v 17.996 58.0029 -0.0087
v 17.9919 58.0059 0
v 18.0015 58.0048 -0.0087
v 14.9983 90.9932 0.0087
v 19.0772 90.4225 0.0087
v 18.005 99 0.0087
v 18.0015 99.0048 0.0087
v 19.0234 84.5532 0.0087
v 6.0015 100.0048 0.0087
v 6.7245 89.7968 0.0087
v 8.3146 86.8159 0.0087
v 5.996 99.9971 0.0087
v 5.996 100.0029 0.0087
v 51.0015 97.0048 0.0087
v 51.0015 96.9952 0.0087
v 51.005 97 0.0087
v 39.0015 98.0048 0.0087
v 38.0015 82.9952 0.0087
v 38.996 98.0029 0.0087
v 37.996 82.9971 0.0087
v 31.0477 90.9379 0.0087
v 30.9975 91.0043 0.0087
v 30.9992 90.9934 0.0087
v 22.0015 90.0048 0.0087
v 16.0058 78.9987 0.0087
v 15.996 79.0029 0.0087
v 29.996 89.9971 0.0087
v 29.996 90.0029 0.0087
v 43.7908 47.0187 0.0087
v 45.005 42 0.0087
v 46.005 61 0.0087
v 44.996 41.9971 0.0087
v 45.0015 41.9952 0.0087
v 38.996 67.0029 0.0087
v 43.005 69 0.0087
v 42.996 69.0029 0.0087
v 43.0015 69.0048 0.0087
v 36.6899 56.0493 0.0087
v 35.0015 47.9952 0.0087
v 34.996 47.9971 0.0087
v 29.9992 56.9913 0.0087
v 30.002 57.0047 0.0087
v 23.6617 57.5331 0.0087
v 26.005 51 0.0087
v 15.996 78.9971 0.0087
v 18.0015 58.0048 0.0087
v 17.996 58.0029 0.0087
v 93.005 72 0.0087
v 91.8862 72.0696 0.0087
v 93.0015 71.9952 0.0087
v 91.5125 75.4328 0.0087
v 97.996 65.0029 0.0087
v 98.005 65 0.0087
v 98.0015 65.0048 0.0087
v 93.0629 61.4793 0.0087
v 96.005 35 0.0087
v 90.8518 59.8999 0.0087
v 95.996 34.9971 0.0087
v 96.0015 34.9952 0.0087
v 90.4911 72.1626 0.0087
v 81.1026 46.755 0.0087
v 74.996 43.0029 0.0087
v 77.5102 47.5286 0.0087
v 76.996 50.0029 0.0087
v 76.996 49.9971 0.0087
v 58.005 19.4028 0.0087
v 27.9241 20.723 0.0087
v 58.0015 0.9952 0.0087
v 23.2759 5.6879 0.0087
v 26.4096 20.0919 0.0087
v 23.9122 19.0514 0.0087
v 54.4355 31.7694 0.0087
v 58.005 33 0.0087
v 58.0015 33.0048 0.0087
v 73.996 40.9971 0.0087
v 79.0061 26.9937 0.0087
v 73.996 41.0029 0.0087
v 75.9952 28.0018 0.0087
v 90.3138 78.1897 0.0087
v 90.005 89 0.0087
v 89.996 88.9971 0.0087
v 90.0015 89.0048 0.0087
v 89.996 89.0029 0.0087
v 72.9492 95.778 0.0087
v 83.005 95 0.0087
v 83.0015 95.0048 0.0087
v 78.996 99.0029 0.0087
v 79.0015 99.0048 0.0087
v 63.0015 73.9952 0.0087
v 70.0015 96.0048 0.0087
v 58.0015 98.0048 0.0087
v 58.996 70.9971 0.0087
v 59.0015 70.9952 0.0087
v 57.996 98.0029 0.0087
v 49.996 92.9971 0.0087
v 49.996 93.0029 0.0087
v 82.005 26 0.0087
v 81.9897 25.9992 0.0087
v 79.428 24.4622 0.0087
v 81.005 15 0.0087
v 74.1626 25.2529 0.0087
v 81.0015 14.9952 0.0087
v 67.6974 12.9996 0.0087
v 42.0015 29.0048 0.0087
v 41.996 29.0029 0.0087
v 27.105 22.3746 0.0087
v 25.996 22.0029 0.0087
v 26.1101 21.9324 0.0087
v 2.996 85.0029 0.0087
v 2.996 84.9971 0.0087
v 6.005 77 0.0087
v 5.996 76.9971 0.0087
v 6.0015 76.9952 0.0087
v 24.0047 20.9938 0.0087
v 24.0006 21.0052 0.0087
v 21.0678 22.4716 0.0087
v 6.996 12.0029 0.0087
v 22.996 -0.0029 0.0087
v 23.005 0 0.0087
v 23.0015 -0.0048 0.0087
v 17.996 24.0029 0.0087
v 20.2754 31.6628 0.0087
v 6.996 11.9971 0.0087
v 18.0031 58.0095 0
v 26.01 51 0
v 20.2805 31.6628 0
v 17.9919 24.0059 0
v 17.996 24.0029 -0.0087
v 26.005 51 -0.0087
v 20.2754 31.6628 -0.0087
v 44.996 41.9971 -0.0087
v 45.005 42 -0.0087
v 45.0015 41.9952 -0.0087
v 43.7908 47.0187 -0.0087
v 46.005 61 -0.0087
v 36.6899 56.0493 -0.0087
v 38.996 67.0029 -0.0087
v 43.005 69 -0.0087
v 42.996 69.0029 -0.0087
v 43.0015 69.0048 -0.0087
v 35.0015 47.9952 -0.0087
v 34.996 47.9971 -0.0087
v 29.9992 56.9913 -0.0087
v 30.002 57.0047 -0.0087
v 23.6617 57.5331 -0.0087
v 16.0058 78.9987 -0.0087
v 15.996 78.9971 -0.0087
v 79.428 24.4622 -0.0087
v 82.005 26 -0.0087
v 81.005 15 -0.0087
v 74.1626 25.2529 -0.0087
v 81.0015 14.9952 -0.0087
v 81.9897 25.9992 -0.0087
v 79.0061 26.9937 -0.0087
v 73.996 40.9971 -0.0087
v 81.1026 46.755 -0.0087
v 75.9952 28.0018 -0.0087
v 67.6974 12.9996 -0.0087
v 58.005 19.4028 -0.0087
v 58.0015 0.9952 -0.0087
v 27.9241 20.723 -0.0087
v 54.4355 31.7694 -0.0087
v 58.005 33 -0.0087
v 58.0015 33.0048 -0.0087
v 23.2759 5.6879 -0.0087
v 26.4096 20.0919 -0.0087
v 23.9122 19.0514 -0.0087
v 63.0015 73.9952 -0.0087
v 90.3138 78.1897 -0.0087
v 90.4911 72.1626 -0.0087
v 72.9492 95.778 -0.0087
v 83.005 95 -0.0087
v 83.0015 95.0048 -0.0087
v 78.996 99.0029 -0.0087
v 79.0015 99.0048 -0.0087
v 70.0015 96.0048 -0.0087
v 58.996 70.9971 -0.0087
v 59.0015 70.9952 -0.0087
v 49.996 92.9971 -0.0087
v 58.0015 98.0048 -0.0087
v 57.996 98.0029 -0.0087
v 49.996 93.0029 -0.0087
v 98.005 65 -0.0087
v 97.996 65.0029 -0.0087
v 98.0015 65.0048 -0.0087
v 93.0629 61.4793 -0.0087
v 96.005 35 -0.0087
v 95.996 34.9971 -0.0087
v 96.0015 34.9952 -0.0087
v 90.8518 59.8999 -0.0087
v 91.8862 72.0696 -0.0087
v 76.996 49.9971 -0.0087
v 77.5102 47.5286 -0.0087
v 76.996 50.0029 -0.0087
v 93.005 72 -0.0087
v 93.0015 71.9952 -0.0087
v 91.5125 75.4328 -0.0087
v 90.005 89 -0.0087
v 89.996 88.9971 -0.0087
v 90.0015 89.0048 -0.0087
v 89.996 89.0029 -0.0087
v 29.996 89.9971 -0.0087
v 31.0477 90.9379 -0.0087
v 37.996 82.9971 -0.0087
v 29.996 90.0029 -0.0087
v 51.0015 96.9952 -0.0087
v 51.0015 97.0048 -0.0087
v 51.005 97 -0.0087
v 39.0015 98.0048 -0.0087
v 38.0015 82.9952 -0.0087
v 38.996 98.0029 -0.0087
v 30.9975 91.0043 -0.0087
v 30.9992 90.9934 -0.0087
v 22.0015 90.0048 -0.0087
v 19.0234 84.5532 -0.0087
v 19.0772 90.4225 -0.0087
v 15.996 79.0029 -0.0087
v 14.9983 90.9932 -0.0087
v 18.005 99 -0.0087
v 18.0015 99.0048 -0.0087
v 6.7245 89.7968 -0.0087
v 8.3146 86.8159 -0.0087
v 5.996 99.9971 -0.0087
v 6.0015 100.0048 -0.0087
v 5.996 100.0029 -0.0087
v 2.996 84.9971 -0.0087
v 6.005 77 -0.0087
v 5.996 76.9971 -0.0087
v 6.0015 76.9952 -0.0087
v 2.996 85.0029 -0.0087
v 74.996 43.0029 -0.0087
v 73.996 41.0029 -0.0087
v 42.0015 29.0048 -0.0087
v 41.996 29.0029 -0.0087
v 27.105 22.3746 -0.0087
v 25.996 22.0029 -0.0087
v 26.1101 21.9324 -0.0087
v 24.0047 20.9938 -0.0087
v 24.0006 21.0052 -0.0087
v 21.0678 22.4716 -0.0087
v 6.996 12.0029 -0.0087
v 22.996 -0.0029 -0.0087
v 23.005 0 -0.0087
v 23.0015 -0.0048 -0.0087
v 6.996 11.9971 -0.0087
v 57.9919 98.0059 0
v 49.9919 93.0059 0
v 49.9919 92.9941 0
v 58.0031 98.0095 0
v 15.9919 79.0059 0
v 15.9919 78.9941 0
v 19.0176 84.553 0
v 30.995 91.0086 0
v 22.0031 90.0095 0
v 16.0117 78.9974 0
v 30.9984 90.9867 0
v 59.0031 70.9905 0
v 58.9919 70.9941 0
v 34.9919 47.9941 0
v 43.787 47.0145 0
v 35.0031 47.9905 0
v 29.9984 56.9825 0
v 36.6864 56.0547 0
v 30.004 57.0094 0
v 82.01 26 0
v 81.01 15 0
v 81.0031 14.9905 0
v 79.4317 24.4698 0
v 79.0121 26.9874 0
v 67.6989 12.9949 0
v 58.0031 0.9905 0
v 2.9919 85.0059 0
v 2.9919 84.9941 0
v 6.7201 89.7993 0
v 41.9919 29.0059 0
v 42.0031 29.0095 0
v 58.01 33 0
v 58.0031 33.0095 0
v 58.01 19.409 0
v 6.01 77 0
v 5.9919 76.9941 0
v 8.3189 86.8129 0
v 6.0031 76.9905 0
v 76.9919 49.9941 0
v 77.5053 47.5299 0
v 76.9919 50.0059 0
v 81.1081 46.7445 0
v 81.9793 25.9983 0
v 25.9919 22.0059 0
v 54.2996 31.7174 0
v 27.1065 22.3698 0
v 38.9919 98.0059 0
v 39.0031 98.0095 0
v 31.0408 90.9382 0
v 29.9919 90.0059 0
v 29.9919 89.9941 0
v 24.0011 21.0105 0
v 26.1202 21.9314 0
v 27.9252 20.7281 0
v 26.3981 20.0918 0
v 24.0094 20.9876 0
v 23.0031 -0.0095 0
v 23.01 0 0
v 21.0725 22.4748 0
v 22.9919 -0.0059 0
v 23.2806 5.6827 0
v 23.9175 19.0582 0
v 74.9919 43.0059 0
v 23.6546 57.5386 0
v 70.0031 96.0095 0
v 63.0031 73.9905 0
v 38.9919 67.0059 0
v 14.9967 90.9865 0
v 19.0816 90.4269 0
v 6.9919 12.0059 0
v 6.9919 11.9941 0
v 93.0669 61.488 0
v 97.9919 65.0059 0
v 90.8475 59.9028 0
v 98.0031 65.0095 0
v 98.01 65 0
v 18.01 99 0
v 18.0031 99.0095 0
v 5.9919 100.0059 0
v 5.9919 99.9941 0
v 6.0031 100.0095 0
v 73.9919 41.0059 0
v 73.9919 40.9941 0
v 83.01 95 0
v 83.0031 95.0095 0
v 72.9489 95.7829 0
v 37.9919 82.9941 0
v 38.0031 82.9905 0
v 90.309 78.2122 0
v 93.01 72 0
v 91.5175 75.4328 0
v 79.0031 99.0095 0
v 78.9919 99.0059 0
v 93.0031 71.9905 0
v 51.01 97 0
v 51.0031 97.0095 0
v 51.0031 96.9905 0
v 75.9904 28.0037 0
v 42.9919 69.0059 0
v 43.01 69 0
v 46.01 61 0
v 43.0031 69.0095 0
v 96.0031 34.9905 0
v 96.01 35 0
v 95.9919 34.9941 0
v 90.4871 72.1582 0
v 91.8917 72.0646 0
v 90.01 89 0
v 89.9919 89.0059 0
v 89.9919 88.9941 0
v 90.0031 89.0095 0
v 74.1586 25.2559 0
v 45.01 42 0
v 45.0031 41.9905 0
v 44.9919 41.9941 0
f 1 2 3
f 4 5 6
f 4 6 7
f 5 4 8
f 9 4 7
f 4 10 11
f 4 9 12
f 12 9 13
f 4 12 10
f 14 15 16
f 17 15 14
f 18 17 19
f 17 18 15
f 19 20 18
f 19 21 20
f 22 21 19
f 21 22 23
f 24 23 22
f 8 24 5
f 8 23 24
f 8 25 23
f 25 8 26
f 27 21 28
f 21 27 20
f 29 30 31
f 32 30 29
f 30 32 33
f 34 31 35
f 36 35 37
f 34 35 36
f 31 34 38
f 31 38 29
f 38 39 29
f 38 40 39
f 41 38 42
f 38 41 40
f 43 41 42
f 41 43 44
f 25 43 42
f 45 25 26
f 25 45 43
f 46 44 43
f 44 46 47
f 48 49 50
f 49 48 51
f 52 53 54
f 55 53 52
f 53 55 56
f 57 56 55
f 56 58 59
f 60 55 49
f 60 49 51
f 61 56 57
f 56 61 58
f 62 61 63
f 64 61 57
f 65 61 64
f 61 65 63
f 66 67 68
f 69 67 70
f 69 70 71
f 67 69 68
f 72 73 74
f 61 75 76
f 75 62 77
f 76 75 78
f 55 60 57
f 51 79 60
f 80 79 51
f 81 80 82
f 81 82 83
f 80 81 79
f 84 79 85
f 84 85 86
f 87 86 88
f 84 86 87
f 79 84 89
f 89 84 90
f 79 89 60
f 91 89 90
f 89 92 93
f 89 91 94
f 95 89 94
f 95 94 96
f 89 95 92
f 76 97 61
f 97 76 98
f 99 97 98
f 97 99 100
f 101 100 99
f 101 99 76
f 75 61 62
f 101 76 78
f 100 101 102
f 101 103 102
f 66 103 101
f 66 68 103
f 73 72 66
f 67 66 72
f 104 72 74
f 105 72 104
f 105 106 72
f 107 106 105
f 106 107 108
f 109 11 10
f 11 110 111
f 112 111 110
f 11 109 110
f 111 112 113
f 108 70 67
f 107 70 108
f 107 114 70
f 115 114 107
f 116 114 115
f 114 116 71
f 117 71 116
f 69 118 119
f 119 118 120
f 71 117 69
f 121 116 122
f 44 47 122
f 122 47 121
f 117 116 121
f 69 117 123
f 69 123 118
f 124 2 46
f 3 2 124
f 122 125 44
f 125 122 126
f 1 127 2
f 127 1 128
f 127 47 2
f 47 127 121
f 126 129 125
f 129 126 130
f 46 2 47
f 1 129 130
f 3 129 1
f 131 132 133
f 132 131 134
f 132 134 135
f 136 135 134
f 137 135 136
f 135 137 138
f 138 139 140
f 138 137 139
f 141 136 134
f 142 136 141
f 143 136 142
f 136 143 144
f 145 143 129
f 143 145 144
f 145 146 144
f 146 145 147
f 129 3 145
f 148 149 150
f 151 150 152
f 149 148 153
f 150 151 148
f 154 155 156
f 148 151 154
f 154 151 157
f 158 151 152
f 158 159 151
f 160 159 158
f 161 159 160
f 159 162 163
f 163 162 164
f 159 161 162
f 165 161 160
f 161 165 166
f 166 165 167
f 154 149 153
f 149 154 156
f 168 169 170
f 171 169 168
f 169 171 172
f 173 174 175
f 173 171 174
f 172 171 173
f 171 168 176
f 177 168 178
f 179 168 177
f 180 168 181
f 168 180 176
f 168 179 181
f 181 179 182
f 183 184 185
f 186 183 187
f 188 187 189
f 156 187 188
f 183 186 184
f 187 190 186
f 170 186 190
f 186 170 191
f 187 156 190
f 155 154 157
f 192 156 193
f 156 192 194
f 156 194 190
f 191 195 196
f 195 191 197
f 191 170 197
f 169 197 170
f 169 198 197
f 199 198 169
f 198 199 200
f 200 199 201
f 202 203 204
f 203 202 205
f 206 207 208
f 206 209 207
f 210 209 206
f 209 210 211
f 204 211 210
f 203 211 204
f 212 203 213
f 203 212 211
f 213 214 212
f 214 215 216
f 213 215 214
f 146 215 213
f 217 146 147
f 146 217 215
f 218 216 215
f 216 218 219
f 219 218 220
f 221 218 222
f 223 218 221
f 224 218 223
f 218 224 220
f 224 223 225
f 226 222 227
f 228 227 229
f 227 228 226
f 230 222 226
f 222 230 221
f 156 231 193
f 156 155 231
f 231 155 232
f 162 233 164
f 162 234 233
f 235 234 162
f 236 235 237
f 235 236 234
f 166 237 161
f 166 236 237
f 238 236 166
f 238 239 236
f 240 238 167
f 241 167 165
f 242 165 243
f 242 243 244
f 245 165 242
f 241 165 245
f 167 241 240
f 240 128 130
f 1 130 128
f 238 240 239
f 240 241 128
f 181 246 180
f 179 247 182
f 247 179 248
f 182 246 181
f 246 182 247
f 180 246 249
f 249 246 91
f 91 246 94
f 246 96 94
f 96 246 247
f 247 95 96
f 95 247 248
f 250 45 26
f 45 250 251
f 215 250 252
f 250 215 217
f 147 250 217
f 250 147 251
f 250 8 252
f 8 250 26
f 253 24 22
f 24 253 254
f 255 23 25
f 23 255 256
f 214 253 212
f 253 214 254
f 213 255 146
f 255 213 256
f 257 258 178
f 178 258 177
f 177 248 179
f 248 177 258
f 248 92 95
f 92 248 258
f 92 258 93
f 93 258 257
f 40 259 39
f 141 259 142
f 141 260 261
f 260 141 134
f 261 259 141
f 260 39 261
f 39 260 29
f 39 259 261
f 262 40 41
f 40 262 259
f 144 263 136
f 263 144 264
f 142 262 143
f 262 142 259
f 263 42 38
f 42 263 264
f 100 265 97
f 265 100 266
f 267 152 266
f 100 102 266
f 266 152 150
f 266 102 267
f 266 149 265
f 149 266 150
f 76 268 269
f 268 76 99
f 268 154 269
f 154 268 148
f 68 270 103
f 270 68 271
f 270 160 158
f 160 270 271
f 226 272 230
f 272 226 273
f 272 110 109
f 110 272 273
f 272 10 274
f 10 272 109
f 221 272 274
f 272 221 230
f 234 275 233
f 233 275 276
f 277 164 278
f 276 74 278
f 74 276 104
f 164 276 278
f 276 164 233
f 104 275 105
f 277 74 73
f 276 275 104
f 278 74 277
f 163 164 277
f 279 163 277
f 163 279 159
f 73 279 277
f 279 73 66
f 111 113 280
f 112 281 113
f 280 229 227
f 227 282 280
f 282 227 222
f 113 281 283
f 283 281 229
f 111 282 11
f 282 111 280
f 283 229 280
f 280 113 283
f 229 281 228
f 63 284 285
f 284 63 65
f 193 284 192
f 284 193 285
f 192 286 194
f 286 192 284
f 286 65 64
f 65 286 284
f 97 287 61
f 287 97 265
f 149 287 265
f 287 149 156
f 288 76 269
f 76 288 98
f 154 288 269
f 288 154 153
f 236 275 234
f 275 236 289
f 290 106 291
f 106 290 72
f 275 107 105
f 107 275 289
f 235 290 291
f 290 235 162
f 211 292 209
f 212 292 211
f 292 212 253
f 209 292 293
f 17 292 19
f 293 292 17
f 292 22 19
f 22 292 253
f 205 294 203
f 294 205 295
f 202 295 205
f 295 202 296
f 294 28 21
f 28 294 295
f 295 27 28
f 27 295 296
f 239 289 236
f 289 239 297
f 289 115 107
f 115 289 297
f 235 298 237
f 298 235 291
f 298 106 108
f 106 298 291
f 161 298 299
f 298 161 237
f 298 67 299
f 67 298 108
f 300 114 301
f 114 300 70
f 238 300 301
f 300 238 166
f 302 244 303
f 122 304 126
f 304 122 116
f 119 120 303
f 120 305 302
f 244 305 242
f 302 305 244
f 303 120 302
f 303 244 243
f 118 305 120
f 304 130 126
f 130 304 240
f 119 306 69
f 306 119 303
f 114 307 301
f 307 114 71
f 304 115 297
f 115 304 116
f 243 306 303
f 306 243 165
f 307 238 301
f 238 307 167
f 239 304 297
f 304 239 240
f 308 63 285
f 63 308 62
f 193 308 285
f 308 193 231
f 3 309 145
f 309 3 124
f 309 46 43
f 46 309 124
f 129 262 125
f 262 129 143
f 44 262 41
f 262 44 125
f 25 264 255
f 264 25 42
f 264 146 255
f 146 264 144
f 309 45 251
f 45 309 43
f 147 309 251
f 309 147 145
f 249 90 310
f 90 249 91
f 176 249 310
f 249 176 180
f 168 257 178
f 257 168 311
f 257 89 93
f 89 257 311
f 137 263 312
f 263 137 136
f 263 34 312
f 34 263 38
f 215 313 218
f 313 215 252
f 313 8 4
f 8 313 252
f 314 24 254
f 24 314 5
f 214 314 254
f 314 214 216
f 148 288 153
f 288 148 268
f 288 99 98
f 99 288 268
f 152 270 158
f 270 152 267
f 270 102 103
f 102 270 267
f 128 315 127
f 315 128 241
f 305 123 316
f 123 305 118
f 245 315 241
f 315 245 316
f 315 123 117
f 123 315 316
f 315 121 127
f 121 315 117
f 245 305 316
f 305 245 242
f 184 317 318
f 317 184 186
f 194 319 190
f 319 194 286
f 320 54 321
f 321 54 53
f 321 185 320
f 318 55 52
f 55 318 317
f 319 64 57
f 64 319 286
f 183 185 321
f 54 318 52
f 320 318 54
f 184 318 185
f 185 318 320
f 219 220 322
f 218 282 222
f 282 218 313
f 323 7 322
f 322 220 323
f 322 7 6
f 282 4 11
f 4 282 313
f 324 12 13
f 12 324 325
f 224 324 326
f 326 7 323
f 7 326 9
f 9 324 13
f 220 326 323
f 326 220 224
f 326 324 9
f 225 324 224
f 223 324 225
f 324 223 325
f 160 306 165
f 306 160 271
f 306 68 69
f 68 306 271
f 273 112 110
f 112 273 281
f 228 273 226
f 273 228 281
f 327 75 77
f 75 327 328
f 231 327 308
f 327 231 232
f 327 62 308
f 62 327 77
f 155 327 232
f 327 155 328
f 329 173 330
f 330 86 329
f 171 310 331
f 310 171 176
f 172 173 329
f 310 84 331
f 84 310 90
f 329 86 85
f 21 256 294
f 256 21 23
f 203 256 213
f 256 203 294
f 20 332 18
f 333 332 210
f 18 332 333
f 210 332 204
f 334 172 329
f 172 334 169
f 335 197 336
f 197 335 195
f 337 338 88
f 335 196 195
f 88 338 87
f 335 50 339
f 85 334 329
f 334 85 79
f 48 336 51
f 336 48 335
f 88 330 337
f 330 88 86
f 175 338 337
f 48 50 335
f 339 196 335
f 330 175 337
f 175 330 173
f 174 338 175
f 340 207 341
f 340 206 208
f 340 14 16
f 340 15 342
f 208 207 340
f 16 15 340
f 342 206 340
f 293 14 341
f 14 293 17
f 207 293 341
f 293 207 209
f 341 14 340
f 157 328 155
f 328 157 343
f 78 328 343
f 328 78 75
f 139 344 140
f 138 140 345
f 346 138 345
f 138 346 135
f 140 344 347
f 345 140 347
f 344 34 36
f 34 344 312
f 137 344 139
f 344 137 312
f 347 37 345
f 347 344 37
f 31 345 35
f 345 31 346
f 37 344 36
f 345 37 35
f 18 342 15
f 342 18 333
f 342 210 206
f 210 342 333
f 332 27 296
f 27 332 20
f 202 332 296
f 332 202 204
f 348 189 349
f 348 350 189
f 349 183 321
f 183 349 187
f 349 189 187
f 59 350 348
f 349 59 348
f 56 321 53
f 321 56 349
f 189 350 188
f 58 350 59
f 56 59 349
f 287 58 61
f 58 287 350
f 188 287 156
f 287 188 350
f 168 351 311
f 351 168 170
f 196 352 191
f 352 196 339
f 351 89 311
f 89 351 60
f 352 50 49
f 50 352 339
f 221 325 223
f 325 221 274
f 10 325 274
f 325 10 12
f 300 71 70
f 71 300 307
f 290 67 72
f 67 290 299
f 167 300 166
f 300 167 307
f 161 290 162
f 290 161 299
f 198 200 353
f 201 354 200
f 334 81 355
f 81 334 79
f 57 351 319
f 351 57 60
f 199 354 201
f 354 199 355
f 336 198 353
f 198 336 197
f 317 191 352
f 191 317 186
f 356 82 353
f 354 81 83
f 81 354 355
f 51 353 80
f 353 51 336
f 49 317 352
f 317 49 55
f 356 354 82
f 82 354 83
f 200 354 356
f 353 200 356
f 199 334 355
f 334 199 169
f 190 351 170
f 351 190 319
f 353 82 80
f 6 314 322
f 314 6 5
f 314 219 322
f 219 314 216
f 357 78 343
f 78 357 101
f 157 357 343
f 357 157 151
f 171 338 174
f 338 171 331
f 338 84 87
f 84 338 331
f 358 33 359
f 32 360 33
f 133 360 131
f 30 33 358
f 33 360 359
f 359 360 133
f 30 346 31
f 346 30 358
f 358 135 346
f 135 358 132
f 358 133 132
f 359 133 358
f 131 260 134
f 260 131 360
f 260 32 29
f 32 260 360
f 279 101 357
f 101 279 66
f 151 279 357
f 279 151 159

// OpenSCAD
color([0.8402878098664139,0.9530478541805099,0.16594803365564914]) hull(){
    translate([18,58]) sphere(0.01);
    translate([18,24]) sphere(0.01);
    translate([26,51]) sphere(0.01);
}
color([0.0023370868964924796,0.7387895340607371,0.5374530602666081]) hull(){
    translate([58,98]) sphere(0.01);
    translate([50,93]) sphere(0.01);
    translate([64,91]) sphere(0.01);
}
color([0.25604025835089217,0.4320068924153808,0.5112453323210508]) hull(){
    translate([22,90]) sphere(0.01);
    translate([20,83]) sphere(0.01);
    translate([16,79]) sphere(0.01);
}
color([0.7462272619347637,0.5039790716190428,0.8850839351693509]) hull(){
    translate([22,90]) sphere(0.01);
    translate([16,79]) sphere(0.01);
    translate([31,91]) sphere(0.01);
}
color([0.6652757233710683,0.22263754843686523,0.08942086350367451]) hull(){
    translate([50,93]) sphere(0.01);
    translate([58,98]) sphere(0.01);
    translate([59,71]) sphere(0.01);
}
color([0.6195232841458308,0.9036720387350747,0.7222923954673625]) hull(){
    translate([44,55]) sphere(0.01);
    translate([44,47]) sphere(0.01);
    translate([35,48]) sphere(0.01);
}
color([0.6665075097113882,0.5421139713900744,0.6943978877819516]) hull(){
    translate([44,55]) sphere(0.01);
    translate([35,48]) sphere(0.01);
    translate([30,57]) sphere(0.01);
}
color([0.9269770591996176,0.12480324665016229,0.8422397758241813]) hull(){
    translate([64,14]) sphere(0.01);
    translate([68,15]) sphere(0.01);
    translate([58,1]) sphere(0.01);
}
color([0.028249143050612435,0.8554899328562455,0.6212809598996976]) hull(){
    translate([68,15]) sphere(0.01);
    translate([82,26]) sphere(0.01);
    translate([81,15]) sphere(0.01);
}
color([0.6435486749275994,0.4857227915978113,0.2898251547629681]) hull(){
    translate([68,15]) sphere(0.01);
    translate([81,15]) sphere(0.01);
    translate([79,27]) sphere(0.01);
}
color([0.21709076393122206,0.4979948584580751,0.6176241526046676]) hull(){
    translate([68,15]) sphere(0.01);
    translate([79,27]) sphere(0.01);
    translate([58,1]) sphere(0.01);
}
color([0.4722249532281336,0.7228331534363125,0.6109414561657331]) hull(){
    translate([10,94]) sphere(0.01);
    translate([6,84]) sphere(0.01);
    translate([3,85]) sphere(0.01);
}
color([0.5330085163671737,0.6769359871291822,0.5973748769978083]) hull(){
    translate([10,94]) sphere(0.01);
    translate([3,85]) sphere(0.01);
    translate([7,86]) sphere(0.01);
}
color([0.14460255854654236,0.21273280877313017,0.8417179364881341]) hull(){
    translate([58,33]) sphere(0.01);
    translate([42,29]) sphere(0.01);
    translate([55,32]) sphere(0.01);
}
color([0.6300391880279899,0.5103677782275869,0.4479627161837708]) hull(){
    translate([58,33]) sphere(0.01);
    translate([55,32]) sphere(0.01);
    translate([58,1]) sphere(0.01);
}
color([0.2903518628620462,0.1744676713524972,0.5457372127765215]) hull(){
    translate([6,84]) sphere(0.01);
    translate([10,94]) sphere(0.01);
    translate([6,77]) sphere(0.01);
}
color([0.6340658375422632,0.7004271366493812,0.690956934786038]) hull(){
    translate([82,26]) sphere(0.01);
    translate([80,52]) sphere(0.01);
    translate([77,50]) sphere(0.01);
}
color([0.013948469234104865,0.8018456354370093,0.2607079205191076]) hull(){
    translate([82,26]) sphere(0.01);
    translate([77,50]) sphere(0.01);
    translate([81,49]) sphere(0.01);
}
color([0.01899716010339858,0.7507132946374245,0.44168653561511173]) hull(){
    translate([82,26]) sphere(0.01);
    translate([81,49]) sphere(0.01);
    translate([76,28]) sphere(0.01);
}
color([0.1668653701245908,0.45955837321901094,0.7876756969907556]) hull(){
    translate([82,26]) sphere(0.01);
    translate([76,28]) sphere(0.01);
    translate([79,27]) sphere(0.01);
}
color([0.09564527702692727,0.06733136152719421,0.7816649665975636]) hull(){
    translate([42,29]) sphere(0.01);
    translate([58,33]) sphere(0.01);
    translate([26,22]) sphere(0.01);
}
color([0.030385075649315252,0.33346286891595733,0.08647112242809318]) hull(){
    translate([39,98]) sphere(0.01);
    translate([31,91]) sphere(0.01);
    translate([37,88]) sphere(0.01);
}
color([0.8161439782233904,0.05657658467482607,0.8243668117903717]) hull(){
    translate([39,98]) sphere(0.01);
    translate([37,88]) sphere(0.01);
    translate([30,90]) sphere(0.01);
}
color([0.05808931884644186,0.6181904095369413,0.1426995958976538]) hull(){
    translate([26,22]) sphere(0.01);
    translate([42,29]) sphere(0.01);
    translate([24,21]) sphere(0.01);
}
color([0.3846464495954227,0.3794414211645075,0.7643773332264734]) hull(){
    translate([26,22]) sphere(0.01);
    translate([24,21]) sphere(0.01);
    translate([32,18]) sphere(0.01);
}
color([0.3116889002403487,0.7690158776827113,0.7674729074453902]) hull(){
    translate([18,24]) sphere(0.01);
    translate([18,58]) sphere(0.01);
    translate([23,0]) sphere(0.01);
}
color([0.3394448706328078,0.45855440081433096,0.0007502935671159783]) hull(){
    translate([18,24]) sphere(0.01);
    translate([23,0]) sphere(0.01);
    translate([24,21]) sphere(0.01);
}
color([0.8084995756647368,0.0331322283588068,0.9954935019736515]) hull(){
    translate([44,47]) sphere(0.01);
    translate([44,55]) sphere(0.01);
    translate([46,61]) sphere(0.01);
}
color([0.32750610520168044,0.511786711221762,0.09639677946248049]) hull(){
    translate([80,52]) sphere(0.01);
    translate([82,26]) sphere(0.01);
    translate([81,49]) sphere(0.01);
}
color([0.46647601470953737,0.043404226035316795,0.8089506697449751]) hull(){
    translate([80,52]) sphere(0.01);
    translate([81,49]) sphere(0.01);
    translate([75,43]) sphere(0.01);
}
color([0.9065579579370614,0.48874197586323487,0.4689182776921319]) hull(){
    translate([80,52]) sphere(0.01);
    translate([75,43]) sphere(0.01);
    translate([91,55]) sphere(0.01);
}
color([0.9999833648369341,0.42392948264922625,0.11056216143511133]) hull(){
    translate([26,51]) sphere(0.01);
    translate([18,58]) sphere(0.01);
    translate([30,57]) sphere(0.01);
}
color([0.5007484231317689,0.23725843071495933,0.7435751616565288]) hull(){
    translate([26,51]) sphere(0.01);
    translate([30,57]) sphere(0.01);
    translate([16,79]) sphere(0.01);
}
color([0.030326511183225713,0.9534383365251057,0.44454391677925087]) hull(){
    translate([59,71]) sphere(0.01);
    translate([58,98]) sphere(0.01);
    translate([70,96]) sphere(0.01);
}
color([0.4017260225039573,0.6984802625757133,0.14751428227125585]) hull(){
    translate([59,71]) sphere(0.01);
    translate([70,96]) sphere(0.01);
    translate([67,87]) sphere(0.01);
}
color([0.592053202978914,0.7602792343344718,0.23214841748979886]) hull(){
    translate([59,71]) sphere(0.01);
    translate([67,87]) sphere(0.01);
    translate([63,74]) sphere(0.01);
}
color([0.2215781656479593,0.24536616409996503,0.7021925659500807]) hull(){
    translate([35,48]) sphere(0.01);
    translate([44,47]) sphere(0.01);
    translate([39,67]) sphere(0.01);
}
color([0.5457605096294114,0.54011508338913,0.5459453680001618]) hull(){
    translate([20,83]) sphere(0.01);
    translate([22,90]) sphere(0.01);
    translate([15,91]) sphere(0.01);
}
color([0.21439919344985514,0.4167057873106884,0.6193494045718565]) hull(){
    translate([81,15]) sphere(0.01);
    translate([82,26]) sphere(0.01);
    translate([72,20]) sphere(0.01);
}
color([0.45760594266221877,0.8933837090972113,0.8109172526149769]) hull(){
    translate([81,15]) sphere(0.01);
    translate([72,20]) sphere(0.01);
    translate([21,6]) sphere(0.01);
}
color([0.14833972802097417,0.6068004170768148,0.5080529466064481]) hull(){
    translate([23,0]) sphere(0.01);
    translate([18,24]) sphere(0.01);
    translate([7,12]) sphere(0.01);
}
color([0.9906187087676633,0.11352393843166497,0.6883720652754897]) hull(){
    translate([23,0]) sphere(0.01);
    translate([7,12]) sphere(0.01);
    translate([21,6]) sphere(0.01);
}
color([0.5952346609945763,0.6540807806784664,0.3474259839548979]) hull(){
    translate([77,50]) sphere(0.01);
    translate([80,52]) sphere(0.01);
    translate([91,55]) sphere(0.01);
}
color([0.9928586924360654,0.247192741454632,0.70975753974483]) hull(){
    translate([77,50]) sphere(0.01);
    translate([91,55]) sphere(0.01);
    translate([98,65]) sphere(0.01);
}
color([0.13794757021236903,0.4611444179186315,0.04899626755467579]) hull(){
    translate([18,99]) sphere(0.01);
    translate([7,86]) sphere(0.01);
    translate([15,91]) sphere(0.01);
}
color([0.1977229983916683,0.036370797334404625,0.13840798504488894]) hull(){
    translate([18,99]) sphere(0.01);
    translate([15,91]) sphere(0.01);
    translate([6,100]) sphere(0.01);
}
color([0.695134065044521,0.2654011745990712,0.4635417367699751]) hull(){
    translate([72,20]) sphere(0.01);
    translate([81,15]) sphere(0.01);
    translate([21,6]) sphere(0.01);
}
color([0.14067843926211876,0.3233092624720053,0.6766209265725885]) hull(){
    translate([72,20]) sphere(0.01);
    translate([21,6]) sphere(0.01);
    translate([58,1]) sphere(0.01);
}
color([0.5598941248919586,0.2674263193966361,0.7715367321750608]) hull(){
    translate([24,21]) sphere(0.01);
    translate([26,22]) sphere(0.01);
    translate([32,18]) sphere(0.01);
}
color([0.7775867750177572,0.3358457771023752,0.7984986383285079]) hull(){
    translate([3,85]) sphere(0.01);
    translate([6,84]) sphere(0.01);
    translate([6,77]) sphere(0.01);
}
color([0.3608344962449672,0.130636609727118,0.1470050456404287]) hull(){
    translate([3,85]) sphere(0.01);
    translate([6,77]) sphere(0.01);
    translate([7,86]) sphere(0.01);
}
color([0.5817121628313788,0.46286602772829477,0.8824527290015699]) hull(){
    translate([30,57]) sphere(0.01);
    translate([18,58]) sphere(0.01);
    translate([26,51]) sphere(0.01);
}
color([0.1201105517589024,0.1938197880719691,0.4695931850983104]) hull(){
    translate([30,57]) sphere(0.01);
    translate([26,51]) sphere(0.01);
    translate([16,79]) sphere(0.01);
}
color([0.14078313852784263,0.6451769219884874,0.9811903017448982]) hull(){
    translate([81,49]) sphere(0.01);
    translate([80,52]) sphere(0.01);
    translate([75,43]) sphere(0.01);
}
color([0.8740229692652243,0.6541461711493592,0.21289315855754942]) hull(){
    translate([81,49]) sphere(0.01);
    translate([75,43]) sphere(0.01);
    translate([74,41]) sphere(0.01);
}
color([0.9328418457966335,0.42345059226773774,0.5012376899041451]) hull(){
    translate([16,79]) sphere(0.01);
    translate([22,90]) sphere(0.01);
    translate([20,83]) sphere(0.01);
}
color([0.5811541702347708,0.2791891573101454,0.2092311813057095]) hull(){
    translate([16,79]) sphere(0.01);
    translate([20,83]) sphere(0.01);
    translate([31,91]) sphere(0.01);
}
color([0.9628933046967749,0.6198760626942967,0.5999578261672418]) hull(){
    translate([70,96]) sphere(0.01);
    translate([59,71]) sphere(0.01);
    translate([67,87]) sphere(0.01);
}
color([0.23874719597172656,0.5159213977515871,0.8042715508319355]) hull(){
    translate([70,96]) sphere(0.01);
    translate([67,87]) sphere(0.01);
    translate([83,95]) sphere(0.01);
}
color([0.6755197251802578,0.41487488756696345,0.5733633065217538]) hull(){
    translate([6,77]) sphere(0.01);
    translate([6,84]) sphere(0.01);
    translate([7,86]) sphere(0.01);
}
color([0.8352652083788017,0.4789645616530247,0.8888242662849705]) hull(){
    translate([31,91]) sphere(0.01);
    translate([39,98]) sphere(0.01);
    translate([37,88]) sphere(0.01);
}
color([0.7977003312522131,0.4430245559395397,0.5757872208285841]) hull(){
    translate([31,91]) sphere(0.01);
    translate([37,88]) sphere(0.01);
    translate([38,83]) sphere(0.01);
}
color([0.18894415855786206,0.8084526775944827,0.5240727557148024]) hull(){
    translate([79,99]) sphere(0.01);
    translate([83,95]) sphere(0.01);
    translate([93,72]) sphere(0.01);
}
color([0.33009817895383553,0.6358447971330878,0.274476683198677]) hull(){
    translate([64,91]) sphere(0.01);
    translate([58,98]) sphere(0.01);
    translate([70,96]) sphere(0.01);
}
color([0.7036882936284021,0.9548751840233447,0.5755708060880032]) hull(){
    translate([64,91]) sphere(0.01);
    translate([70,96]) sphere(0.01);
    translate([83,95]) sphere(0.01);
}
color([0.41204698353559877,0.5796286851254486,0.28286322414623355]) hull(){
    translate([37,88]) sphere(0.01);
    translate([39,98]) sphere(0.01);
    translate([51,97]) sphere(0.01);
}
color([0.83488960487533,0.7968053445508819,0.9111606805714901]) hull(){
    translate([37,88]) sphere(0.01);
    translate([51,97]) sphere(0.01);
    translate([30,90]) sphere(0.01);
}
color([0.24277728252059738,0.2698201644401115,0.25372921938475945]) hull(){
    translate([75,43]) sphere(0.01);
    translate([81,49]) sphere(0.01);
    translate([74,41]) sphere(0.01);
}
color([0.3248429479181304,0.33731838939050207,0.46012102584031667]) hull(){
    translate([75,43]) sphere(0.01);
    translate([74,41]) sphere(0.01);
    translate([76,28]) sphere(0.01);
}
color([0.4972140619467261,0.4460540182101679,0.582257111213957]) hull(){
    translate([67,87]) sphere(0.01);
    translate([59,71]) sphere(0.01);
    translate([63,74]) sphere(0.01);
}
color([0.38189019333285656,0.9329183366158048,0.74346568951076]) hull(){
    translate([67,87]) sphere(0.01);
    translate([63,74]) sphere(0.01);
    translate([83,95]) sphere(0.01);
}
color([0.10367473231816282,0.6513301228797536,0.21210212161149367]) hull(){
    translate([43,69]) sphere(0.01);
    translate([46,61]) sphere(0.01);
    translate([39,67]) sphere(0.01);
}
color([0.4071949612628585,0.6715659813617996,0.17871221391606673]) hull(){
    translate([46,61]) sphere(0.01);
    translate([44,55]) sphere(0.01);
    translate([35,48]) sphere(0.01);
}
color([0.17752412341011714,0.6556599876579107,0.7040052939421468]) hull(){
    translate([46,61]) sphere(0.01);
    translate([35,48]) sphere(0.01);
    translate([39,67]) sphere(0.01);
}
color([0.9236087761692187,0.21340315940002685,0.5989435772305987]) hull(){
    translate([51,97]) sphere(0.01);
    translate([37,88]) sphere(0.01);
    translate([38,83]) sphere(0.01);
}
color([0.8450733127471588,0.6003349610680997,0.5954496070156984]) hull(){
    translate([51,97]) sphere(0.01);
    translate([38,83]) sphere(0.01);
    translate([30,90]) sphere(0.01);
}
color([0.920709623693076,0.4233833186292486,0.4754938941291812]) hull(){
    translate([7,12]) sphere(0.01);
    translate([23,0]) sphere(0.01);
    translate([21,6]) sphere(0.01);
}
color([0.872421437716006,0.9767589381362137,0.9086126193256788]) hull(){
    translate([38,83]) sphere(0.01);
    translate([31,91]) sphere(0.01);
    translate([37,88]) sphere(0.01);
}
color([0.7884233486788577,0.8262914624918754,0.6636415038118221]) hull(){
    translate([55,32]) sphere(0.01);
    translate([58,33]) sphere(0.01);
    translate([58,1]) sphere(0.01);
}
color([0.36270118963089737,0.5138414630226216,0.14357255994509865]) hull(){
    translate([55,32]) sphere(0.01);
    translate([58,1]) sphere(0.01);
    translate([21,6]) sphere(0.01);
}
color([0.466624584989368,0.29734697142143796,0.9844700368526675]) hull(){
    translate([30,90]) sphere(0.01);
    translate([51,97]) sphere(0.01);
    translate([38,83]) sphere(0.01);
}
color([0.6752891164641136,0.29017518075598103,0.4342964607752302]) hull(){
    translate([91,55]) sphere(0.01);
    translate([77,50]) sphere(0.01);
    translate([98,65]) sphere(0.01);
}
color([0.773003957160343,0.565247166210502,0.9239404304157245]) hull(){
    translate([91,55]) sphere(0.01);
    translate([98,65]) sphere(0.01);
    translate([96,35]) sphere(0.01);
}
color([0.16032310979410902,0.8355206000915061,0.5688487402091276]) hull(){
    translate([98,65]) sphere(0.01);
    translate([77,50]) sphere(0.01);
    translate([96,35]) sphere(0.01);
}
color([0.20030491603062106,0.9799112189115262,0.7788088383598656]) hull(){
    translate([63,74]) sphere(0.01);
    translate([67,87]) sphere(0.01);
    translate([83,95]) sphere(0.01);
}
color([0.3331229107175697,0.956723341350572,0.8892995412421422]) hull(){
    translate([63,74]) sphere(0.01);
    translate([83,95]) sphere(0.01);
    translate([93,72]) sphere(0.01);
}
color([0.9938355783742772,0.5564778243748569,0.9329279768345969]) hull(){
    translate([32,18]) sphere(0.01);
    translate([26,22]) sphere(0.01);
    translate([24,21]) sphere(0.01);
}
color([0.35340897744289224,0.12062022214202717,0.7238287945893779]) hull(){
    translate([7,86]) sphere(0.01);
    translate([18,99]) sphere(0.01);
    translate([15,91]) sphere(0.01);
}
color([0.8432397019629626,0.2883830928152321,0.23139986036280558]) hull(){
    translate([7,86]) sphere(0.01);
    translate([15,91]) sphere(0.01);
    translate([6,100]) sphere(0.01);
}
color([0.0180364627349191,0.35314011923198985,0.9589424474672257]) hull(){
    translate([74,41]) sphere(0.01);
    translate([75,43]) sphere(0.01);
    translate([76,28]) sphere(0.01);
}
color([0.2619290021782883,0.20369548429490625,0.5420815487250377]) hull(){
    translate([21,6]) sphere(0.01);
    translate([23,0]) sphere(0.01);
    translate([7,12]) sphere(0.01);
}
color([0.9221305525684157,0.837748898711002,0.8622867035840079]) hull(){
    translate([21,6]) sphere(0.01);
    translate([7,12]) sphere(0.01);
    translate([55,32]) sphere(0.01);
}
color([0.727429224436118,0.821332708873966,0.2567577523046298]) hull(){
    translate([96,35]) sphere(0.01);
    translate([91,55]) sphere(0.01);
    translate([90,89]) sphere(0.01);
}
color([0.1353372895865157,0.7613019869252476,0.15437996216449157]) hull(){
    translate([90,89]) sphere(0.01);
    translate([91,55]) sphere(0.01);
    translate([96,35]) sphere(0.01);
}
color([0.5724302025923821,0.22728732004270547,0.8377719495956792]) hull(){
    translate([15,91]) sphere(0.01);
    translate([20,83]) sphere(0.01);
    translate([18,99]) sphere(0.01);
}
color([0.3661955888727618,0.7135191579002272,0.515047468161266]) hull(){
    translate([15,91]) sphere(0.01);
    translate([18,99]) sphere(0.01);
    translate([7,86]) sphere(0.01);
}
color([0.13764795316468892,0.40448573996937276,0.8917260836787828]) hull(){
    translate([6,100]) sphere(0.01);
    translate([15,91]) sphere(0.01);
    translate([7,86]) sphere(0.01);
}
color([0.7643233656004556,0.5236824296690593,0.15029798138806982]) hull(){
    translate([76,28]) sphere(0.01);
    translate([81,49]) sphere(0.01);
    translate([74,41]) sphere(0.01);
}
color([0.9580407420374472,0.6000911555631969,0.025324835711835636]) hull(){
    translate([76,28]) sphere(0.01);
    translate([74,41]) sphere(0.01);
    translate([79,27]) sphere(0.01);
}
color([0.8628581448400192,0.48332959823715915,0.760144685355809]) hull(){
    translate([39,67]) sphere(0.01);
    translate([35,48]) sphere(0.01);
    translate([43,69]) sphere(0.01);
}
color([0.17349489212301172,0.7172022627612936,0.8738126079333703]) hull(){
    translate([79,27]) sphere(0.01);
    translate([76,28]) sphere(0.01);
    translate([58,1]) sphere(0.01);
}
color([0.7407081150283871,0.1750257628023656,0.7717601752613227]) hull(){
    translate([83,95]) sphere(0.01);
    translate([79,99]) sphere(0.01);
    translate([93,72]) sphere(0.01);
}
color([0.17462951192396858,0.1365817917740666,0.790898096633715]) hull(){
    translate([83,95]) sphere(0.01);
    translate([64,91]) sphere(0.01);
    translate([79,99]) sphere(0.01);
}
color([0.05068813004758421,0.2747417086491215,0.9775332998919624]) hull(){
    translate([93,72]) sphere(0.01);
    translate([63,74]) sphere(0.01);
    translate([83,95]) sphere(0.01);
}
color([0.3741990821064618,0.5760507248775137,0.9764706525564496]) hull(){
    translate([45,42]) sphere(0.01);
    translate([44,47]) sphere(0.01);
    translate([46,61]) sphere(0.01);
}
color([0.6412339051880062,0.9116486495874845,0.653753263894704]) hull(){
    translate([45,42]) sphere(0.01);
    translate([46,61]) sphere(0.01);
    translate([39,67]) sphere(0.01);
}
color([0.7391387592304974,0.7973855488942889,0.8338139774032114]) hull(){
    translate([58,1]) sphere(0.01);
    translate([79,27]) sphere(0.01);
    translate([21,6]) sphere(0.01);
}
color([0.5893068505654989,0.9387852932083598,0.6768105799142914]) hull(){
    translate([58,1]) sphere(0.01);
    translate([21,6]) sphere(0.01);
    translate([55,32]) sphere(0.01);
}
